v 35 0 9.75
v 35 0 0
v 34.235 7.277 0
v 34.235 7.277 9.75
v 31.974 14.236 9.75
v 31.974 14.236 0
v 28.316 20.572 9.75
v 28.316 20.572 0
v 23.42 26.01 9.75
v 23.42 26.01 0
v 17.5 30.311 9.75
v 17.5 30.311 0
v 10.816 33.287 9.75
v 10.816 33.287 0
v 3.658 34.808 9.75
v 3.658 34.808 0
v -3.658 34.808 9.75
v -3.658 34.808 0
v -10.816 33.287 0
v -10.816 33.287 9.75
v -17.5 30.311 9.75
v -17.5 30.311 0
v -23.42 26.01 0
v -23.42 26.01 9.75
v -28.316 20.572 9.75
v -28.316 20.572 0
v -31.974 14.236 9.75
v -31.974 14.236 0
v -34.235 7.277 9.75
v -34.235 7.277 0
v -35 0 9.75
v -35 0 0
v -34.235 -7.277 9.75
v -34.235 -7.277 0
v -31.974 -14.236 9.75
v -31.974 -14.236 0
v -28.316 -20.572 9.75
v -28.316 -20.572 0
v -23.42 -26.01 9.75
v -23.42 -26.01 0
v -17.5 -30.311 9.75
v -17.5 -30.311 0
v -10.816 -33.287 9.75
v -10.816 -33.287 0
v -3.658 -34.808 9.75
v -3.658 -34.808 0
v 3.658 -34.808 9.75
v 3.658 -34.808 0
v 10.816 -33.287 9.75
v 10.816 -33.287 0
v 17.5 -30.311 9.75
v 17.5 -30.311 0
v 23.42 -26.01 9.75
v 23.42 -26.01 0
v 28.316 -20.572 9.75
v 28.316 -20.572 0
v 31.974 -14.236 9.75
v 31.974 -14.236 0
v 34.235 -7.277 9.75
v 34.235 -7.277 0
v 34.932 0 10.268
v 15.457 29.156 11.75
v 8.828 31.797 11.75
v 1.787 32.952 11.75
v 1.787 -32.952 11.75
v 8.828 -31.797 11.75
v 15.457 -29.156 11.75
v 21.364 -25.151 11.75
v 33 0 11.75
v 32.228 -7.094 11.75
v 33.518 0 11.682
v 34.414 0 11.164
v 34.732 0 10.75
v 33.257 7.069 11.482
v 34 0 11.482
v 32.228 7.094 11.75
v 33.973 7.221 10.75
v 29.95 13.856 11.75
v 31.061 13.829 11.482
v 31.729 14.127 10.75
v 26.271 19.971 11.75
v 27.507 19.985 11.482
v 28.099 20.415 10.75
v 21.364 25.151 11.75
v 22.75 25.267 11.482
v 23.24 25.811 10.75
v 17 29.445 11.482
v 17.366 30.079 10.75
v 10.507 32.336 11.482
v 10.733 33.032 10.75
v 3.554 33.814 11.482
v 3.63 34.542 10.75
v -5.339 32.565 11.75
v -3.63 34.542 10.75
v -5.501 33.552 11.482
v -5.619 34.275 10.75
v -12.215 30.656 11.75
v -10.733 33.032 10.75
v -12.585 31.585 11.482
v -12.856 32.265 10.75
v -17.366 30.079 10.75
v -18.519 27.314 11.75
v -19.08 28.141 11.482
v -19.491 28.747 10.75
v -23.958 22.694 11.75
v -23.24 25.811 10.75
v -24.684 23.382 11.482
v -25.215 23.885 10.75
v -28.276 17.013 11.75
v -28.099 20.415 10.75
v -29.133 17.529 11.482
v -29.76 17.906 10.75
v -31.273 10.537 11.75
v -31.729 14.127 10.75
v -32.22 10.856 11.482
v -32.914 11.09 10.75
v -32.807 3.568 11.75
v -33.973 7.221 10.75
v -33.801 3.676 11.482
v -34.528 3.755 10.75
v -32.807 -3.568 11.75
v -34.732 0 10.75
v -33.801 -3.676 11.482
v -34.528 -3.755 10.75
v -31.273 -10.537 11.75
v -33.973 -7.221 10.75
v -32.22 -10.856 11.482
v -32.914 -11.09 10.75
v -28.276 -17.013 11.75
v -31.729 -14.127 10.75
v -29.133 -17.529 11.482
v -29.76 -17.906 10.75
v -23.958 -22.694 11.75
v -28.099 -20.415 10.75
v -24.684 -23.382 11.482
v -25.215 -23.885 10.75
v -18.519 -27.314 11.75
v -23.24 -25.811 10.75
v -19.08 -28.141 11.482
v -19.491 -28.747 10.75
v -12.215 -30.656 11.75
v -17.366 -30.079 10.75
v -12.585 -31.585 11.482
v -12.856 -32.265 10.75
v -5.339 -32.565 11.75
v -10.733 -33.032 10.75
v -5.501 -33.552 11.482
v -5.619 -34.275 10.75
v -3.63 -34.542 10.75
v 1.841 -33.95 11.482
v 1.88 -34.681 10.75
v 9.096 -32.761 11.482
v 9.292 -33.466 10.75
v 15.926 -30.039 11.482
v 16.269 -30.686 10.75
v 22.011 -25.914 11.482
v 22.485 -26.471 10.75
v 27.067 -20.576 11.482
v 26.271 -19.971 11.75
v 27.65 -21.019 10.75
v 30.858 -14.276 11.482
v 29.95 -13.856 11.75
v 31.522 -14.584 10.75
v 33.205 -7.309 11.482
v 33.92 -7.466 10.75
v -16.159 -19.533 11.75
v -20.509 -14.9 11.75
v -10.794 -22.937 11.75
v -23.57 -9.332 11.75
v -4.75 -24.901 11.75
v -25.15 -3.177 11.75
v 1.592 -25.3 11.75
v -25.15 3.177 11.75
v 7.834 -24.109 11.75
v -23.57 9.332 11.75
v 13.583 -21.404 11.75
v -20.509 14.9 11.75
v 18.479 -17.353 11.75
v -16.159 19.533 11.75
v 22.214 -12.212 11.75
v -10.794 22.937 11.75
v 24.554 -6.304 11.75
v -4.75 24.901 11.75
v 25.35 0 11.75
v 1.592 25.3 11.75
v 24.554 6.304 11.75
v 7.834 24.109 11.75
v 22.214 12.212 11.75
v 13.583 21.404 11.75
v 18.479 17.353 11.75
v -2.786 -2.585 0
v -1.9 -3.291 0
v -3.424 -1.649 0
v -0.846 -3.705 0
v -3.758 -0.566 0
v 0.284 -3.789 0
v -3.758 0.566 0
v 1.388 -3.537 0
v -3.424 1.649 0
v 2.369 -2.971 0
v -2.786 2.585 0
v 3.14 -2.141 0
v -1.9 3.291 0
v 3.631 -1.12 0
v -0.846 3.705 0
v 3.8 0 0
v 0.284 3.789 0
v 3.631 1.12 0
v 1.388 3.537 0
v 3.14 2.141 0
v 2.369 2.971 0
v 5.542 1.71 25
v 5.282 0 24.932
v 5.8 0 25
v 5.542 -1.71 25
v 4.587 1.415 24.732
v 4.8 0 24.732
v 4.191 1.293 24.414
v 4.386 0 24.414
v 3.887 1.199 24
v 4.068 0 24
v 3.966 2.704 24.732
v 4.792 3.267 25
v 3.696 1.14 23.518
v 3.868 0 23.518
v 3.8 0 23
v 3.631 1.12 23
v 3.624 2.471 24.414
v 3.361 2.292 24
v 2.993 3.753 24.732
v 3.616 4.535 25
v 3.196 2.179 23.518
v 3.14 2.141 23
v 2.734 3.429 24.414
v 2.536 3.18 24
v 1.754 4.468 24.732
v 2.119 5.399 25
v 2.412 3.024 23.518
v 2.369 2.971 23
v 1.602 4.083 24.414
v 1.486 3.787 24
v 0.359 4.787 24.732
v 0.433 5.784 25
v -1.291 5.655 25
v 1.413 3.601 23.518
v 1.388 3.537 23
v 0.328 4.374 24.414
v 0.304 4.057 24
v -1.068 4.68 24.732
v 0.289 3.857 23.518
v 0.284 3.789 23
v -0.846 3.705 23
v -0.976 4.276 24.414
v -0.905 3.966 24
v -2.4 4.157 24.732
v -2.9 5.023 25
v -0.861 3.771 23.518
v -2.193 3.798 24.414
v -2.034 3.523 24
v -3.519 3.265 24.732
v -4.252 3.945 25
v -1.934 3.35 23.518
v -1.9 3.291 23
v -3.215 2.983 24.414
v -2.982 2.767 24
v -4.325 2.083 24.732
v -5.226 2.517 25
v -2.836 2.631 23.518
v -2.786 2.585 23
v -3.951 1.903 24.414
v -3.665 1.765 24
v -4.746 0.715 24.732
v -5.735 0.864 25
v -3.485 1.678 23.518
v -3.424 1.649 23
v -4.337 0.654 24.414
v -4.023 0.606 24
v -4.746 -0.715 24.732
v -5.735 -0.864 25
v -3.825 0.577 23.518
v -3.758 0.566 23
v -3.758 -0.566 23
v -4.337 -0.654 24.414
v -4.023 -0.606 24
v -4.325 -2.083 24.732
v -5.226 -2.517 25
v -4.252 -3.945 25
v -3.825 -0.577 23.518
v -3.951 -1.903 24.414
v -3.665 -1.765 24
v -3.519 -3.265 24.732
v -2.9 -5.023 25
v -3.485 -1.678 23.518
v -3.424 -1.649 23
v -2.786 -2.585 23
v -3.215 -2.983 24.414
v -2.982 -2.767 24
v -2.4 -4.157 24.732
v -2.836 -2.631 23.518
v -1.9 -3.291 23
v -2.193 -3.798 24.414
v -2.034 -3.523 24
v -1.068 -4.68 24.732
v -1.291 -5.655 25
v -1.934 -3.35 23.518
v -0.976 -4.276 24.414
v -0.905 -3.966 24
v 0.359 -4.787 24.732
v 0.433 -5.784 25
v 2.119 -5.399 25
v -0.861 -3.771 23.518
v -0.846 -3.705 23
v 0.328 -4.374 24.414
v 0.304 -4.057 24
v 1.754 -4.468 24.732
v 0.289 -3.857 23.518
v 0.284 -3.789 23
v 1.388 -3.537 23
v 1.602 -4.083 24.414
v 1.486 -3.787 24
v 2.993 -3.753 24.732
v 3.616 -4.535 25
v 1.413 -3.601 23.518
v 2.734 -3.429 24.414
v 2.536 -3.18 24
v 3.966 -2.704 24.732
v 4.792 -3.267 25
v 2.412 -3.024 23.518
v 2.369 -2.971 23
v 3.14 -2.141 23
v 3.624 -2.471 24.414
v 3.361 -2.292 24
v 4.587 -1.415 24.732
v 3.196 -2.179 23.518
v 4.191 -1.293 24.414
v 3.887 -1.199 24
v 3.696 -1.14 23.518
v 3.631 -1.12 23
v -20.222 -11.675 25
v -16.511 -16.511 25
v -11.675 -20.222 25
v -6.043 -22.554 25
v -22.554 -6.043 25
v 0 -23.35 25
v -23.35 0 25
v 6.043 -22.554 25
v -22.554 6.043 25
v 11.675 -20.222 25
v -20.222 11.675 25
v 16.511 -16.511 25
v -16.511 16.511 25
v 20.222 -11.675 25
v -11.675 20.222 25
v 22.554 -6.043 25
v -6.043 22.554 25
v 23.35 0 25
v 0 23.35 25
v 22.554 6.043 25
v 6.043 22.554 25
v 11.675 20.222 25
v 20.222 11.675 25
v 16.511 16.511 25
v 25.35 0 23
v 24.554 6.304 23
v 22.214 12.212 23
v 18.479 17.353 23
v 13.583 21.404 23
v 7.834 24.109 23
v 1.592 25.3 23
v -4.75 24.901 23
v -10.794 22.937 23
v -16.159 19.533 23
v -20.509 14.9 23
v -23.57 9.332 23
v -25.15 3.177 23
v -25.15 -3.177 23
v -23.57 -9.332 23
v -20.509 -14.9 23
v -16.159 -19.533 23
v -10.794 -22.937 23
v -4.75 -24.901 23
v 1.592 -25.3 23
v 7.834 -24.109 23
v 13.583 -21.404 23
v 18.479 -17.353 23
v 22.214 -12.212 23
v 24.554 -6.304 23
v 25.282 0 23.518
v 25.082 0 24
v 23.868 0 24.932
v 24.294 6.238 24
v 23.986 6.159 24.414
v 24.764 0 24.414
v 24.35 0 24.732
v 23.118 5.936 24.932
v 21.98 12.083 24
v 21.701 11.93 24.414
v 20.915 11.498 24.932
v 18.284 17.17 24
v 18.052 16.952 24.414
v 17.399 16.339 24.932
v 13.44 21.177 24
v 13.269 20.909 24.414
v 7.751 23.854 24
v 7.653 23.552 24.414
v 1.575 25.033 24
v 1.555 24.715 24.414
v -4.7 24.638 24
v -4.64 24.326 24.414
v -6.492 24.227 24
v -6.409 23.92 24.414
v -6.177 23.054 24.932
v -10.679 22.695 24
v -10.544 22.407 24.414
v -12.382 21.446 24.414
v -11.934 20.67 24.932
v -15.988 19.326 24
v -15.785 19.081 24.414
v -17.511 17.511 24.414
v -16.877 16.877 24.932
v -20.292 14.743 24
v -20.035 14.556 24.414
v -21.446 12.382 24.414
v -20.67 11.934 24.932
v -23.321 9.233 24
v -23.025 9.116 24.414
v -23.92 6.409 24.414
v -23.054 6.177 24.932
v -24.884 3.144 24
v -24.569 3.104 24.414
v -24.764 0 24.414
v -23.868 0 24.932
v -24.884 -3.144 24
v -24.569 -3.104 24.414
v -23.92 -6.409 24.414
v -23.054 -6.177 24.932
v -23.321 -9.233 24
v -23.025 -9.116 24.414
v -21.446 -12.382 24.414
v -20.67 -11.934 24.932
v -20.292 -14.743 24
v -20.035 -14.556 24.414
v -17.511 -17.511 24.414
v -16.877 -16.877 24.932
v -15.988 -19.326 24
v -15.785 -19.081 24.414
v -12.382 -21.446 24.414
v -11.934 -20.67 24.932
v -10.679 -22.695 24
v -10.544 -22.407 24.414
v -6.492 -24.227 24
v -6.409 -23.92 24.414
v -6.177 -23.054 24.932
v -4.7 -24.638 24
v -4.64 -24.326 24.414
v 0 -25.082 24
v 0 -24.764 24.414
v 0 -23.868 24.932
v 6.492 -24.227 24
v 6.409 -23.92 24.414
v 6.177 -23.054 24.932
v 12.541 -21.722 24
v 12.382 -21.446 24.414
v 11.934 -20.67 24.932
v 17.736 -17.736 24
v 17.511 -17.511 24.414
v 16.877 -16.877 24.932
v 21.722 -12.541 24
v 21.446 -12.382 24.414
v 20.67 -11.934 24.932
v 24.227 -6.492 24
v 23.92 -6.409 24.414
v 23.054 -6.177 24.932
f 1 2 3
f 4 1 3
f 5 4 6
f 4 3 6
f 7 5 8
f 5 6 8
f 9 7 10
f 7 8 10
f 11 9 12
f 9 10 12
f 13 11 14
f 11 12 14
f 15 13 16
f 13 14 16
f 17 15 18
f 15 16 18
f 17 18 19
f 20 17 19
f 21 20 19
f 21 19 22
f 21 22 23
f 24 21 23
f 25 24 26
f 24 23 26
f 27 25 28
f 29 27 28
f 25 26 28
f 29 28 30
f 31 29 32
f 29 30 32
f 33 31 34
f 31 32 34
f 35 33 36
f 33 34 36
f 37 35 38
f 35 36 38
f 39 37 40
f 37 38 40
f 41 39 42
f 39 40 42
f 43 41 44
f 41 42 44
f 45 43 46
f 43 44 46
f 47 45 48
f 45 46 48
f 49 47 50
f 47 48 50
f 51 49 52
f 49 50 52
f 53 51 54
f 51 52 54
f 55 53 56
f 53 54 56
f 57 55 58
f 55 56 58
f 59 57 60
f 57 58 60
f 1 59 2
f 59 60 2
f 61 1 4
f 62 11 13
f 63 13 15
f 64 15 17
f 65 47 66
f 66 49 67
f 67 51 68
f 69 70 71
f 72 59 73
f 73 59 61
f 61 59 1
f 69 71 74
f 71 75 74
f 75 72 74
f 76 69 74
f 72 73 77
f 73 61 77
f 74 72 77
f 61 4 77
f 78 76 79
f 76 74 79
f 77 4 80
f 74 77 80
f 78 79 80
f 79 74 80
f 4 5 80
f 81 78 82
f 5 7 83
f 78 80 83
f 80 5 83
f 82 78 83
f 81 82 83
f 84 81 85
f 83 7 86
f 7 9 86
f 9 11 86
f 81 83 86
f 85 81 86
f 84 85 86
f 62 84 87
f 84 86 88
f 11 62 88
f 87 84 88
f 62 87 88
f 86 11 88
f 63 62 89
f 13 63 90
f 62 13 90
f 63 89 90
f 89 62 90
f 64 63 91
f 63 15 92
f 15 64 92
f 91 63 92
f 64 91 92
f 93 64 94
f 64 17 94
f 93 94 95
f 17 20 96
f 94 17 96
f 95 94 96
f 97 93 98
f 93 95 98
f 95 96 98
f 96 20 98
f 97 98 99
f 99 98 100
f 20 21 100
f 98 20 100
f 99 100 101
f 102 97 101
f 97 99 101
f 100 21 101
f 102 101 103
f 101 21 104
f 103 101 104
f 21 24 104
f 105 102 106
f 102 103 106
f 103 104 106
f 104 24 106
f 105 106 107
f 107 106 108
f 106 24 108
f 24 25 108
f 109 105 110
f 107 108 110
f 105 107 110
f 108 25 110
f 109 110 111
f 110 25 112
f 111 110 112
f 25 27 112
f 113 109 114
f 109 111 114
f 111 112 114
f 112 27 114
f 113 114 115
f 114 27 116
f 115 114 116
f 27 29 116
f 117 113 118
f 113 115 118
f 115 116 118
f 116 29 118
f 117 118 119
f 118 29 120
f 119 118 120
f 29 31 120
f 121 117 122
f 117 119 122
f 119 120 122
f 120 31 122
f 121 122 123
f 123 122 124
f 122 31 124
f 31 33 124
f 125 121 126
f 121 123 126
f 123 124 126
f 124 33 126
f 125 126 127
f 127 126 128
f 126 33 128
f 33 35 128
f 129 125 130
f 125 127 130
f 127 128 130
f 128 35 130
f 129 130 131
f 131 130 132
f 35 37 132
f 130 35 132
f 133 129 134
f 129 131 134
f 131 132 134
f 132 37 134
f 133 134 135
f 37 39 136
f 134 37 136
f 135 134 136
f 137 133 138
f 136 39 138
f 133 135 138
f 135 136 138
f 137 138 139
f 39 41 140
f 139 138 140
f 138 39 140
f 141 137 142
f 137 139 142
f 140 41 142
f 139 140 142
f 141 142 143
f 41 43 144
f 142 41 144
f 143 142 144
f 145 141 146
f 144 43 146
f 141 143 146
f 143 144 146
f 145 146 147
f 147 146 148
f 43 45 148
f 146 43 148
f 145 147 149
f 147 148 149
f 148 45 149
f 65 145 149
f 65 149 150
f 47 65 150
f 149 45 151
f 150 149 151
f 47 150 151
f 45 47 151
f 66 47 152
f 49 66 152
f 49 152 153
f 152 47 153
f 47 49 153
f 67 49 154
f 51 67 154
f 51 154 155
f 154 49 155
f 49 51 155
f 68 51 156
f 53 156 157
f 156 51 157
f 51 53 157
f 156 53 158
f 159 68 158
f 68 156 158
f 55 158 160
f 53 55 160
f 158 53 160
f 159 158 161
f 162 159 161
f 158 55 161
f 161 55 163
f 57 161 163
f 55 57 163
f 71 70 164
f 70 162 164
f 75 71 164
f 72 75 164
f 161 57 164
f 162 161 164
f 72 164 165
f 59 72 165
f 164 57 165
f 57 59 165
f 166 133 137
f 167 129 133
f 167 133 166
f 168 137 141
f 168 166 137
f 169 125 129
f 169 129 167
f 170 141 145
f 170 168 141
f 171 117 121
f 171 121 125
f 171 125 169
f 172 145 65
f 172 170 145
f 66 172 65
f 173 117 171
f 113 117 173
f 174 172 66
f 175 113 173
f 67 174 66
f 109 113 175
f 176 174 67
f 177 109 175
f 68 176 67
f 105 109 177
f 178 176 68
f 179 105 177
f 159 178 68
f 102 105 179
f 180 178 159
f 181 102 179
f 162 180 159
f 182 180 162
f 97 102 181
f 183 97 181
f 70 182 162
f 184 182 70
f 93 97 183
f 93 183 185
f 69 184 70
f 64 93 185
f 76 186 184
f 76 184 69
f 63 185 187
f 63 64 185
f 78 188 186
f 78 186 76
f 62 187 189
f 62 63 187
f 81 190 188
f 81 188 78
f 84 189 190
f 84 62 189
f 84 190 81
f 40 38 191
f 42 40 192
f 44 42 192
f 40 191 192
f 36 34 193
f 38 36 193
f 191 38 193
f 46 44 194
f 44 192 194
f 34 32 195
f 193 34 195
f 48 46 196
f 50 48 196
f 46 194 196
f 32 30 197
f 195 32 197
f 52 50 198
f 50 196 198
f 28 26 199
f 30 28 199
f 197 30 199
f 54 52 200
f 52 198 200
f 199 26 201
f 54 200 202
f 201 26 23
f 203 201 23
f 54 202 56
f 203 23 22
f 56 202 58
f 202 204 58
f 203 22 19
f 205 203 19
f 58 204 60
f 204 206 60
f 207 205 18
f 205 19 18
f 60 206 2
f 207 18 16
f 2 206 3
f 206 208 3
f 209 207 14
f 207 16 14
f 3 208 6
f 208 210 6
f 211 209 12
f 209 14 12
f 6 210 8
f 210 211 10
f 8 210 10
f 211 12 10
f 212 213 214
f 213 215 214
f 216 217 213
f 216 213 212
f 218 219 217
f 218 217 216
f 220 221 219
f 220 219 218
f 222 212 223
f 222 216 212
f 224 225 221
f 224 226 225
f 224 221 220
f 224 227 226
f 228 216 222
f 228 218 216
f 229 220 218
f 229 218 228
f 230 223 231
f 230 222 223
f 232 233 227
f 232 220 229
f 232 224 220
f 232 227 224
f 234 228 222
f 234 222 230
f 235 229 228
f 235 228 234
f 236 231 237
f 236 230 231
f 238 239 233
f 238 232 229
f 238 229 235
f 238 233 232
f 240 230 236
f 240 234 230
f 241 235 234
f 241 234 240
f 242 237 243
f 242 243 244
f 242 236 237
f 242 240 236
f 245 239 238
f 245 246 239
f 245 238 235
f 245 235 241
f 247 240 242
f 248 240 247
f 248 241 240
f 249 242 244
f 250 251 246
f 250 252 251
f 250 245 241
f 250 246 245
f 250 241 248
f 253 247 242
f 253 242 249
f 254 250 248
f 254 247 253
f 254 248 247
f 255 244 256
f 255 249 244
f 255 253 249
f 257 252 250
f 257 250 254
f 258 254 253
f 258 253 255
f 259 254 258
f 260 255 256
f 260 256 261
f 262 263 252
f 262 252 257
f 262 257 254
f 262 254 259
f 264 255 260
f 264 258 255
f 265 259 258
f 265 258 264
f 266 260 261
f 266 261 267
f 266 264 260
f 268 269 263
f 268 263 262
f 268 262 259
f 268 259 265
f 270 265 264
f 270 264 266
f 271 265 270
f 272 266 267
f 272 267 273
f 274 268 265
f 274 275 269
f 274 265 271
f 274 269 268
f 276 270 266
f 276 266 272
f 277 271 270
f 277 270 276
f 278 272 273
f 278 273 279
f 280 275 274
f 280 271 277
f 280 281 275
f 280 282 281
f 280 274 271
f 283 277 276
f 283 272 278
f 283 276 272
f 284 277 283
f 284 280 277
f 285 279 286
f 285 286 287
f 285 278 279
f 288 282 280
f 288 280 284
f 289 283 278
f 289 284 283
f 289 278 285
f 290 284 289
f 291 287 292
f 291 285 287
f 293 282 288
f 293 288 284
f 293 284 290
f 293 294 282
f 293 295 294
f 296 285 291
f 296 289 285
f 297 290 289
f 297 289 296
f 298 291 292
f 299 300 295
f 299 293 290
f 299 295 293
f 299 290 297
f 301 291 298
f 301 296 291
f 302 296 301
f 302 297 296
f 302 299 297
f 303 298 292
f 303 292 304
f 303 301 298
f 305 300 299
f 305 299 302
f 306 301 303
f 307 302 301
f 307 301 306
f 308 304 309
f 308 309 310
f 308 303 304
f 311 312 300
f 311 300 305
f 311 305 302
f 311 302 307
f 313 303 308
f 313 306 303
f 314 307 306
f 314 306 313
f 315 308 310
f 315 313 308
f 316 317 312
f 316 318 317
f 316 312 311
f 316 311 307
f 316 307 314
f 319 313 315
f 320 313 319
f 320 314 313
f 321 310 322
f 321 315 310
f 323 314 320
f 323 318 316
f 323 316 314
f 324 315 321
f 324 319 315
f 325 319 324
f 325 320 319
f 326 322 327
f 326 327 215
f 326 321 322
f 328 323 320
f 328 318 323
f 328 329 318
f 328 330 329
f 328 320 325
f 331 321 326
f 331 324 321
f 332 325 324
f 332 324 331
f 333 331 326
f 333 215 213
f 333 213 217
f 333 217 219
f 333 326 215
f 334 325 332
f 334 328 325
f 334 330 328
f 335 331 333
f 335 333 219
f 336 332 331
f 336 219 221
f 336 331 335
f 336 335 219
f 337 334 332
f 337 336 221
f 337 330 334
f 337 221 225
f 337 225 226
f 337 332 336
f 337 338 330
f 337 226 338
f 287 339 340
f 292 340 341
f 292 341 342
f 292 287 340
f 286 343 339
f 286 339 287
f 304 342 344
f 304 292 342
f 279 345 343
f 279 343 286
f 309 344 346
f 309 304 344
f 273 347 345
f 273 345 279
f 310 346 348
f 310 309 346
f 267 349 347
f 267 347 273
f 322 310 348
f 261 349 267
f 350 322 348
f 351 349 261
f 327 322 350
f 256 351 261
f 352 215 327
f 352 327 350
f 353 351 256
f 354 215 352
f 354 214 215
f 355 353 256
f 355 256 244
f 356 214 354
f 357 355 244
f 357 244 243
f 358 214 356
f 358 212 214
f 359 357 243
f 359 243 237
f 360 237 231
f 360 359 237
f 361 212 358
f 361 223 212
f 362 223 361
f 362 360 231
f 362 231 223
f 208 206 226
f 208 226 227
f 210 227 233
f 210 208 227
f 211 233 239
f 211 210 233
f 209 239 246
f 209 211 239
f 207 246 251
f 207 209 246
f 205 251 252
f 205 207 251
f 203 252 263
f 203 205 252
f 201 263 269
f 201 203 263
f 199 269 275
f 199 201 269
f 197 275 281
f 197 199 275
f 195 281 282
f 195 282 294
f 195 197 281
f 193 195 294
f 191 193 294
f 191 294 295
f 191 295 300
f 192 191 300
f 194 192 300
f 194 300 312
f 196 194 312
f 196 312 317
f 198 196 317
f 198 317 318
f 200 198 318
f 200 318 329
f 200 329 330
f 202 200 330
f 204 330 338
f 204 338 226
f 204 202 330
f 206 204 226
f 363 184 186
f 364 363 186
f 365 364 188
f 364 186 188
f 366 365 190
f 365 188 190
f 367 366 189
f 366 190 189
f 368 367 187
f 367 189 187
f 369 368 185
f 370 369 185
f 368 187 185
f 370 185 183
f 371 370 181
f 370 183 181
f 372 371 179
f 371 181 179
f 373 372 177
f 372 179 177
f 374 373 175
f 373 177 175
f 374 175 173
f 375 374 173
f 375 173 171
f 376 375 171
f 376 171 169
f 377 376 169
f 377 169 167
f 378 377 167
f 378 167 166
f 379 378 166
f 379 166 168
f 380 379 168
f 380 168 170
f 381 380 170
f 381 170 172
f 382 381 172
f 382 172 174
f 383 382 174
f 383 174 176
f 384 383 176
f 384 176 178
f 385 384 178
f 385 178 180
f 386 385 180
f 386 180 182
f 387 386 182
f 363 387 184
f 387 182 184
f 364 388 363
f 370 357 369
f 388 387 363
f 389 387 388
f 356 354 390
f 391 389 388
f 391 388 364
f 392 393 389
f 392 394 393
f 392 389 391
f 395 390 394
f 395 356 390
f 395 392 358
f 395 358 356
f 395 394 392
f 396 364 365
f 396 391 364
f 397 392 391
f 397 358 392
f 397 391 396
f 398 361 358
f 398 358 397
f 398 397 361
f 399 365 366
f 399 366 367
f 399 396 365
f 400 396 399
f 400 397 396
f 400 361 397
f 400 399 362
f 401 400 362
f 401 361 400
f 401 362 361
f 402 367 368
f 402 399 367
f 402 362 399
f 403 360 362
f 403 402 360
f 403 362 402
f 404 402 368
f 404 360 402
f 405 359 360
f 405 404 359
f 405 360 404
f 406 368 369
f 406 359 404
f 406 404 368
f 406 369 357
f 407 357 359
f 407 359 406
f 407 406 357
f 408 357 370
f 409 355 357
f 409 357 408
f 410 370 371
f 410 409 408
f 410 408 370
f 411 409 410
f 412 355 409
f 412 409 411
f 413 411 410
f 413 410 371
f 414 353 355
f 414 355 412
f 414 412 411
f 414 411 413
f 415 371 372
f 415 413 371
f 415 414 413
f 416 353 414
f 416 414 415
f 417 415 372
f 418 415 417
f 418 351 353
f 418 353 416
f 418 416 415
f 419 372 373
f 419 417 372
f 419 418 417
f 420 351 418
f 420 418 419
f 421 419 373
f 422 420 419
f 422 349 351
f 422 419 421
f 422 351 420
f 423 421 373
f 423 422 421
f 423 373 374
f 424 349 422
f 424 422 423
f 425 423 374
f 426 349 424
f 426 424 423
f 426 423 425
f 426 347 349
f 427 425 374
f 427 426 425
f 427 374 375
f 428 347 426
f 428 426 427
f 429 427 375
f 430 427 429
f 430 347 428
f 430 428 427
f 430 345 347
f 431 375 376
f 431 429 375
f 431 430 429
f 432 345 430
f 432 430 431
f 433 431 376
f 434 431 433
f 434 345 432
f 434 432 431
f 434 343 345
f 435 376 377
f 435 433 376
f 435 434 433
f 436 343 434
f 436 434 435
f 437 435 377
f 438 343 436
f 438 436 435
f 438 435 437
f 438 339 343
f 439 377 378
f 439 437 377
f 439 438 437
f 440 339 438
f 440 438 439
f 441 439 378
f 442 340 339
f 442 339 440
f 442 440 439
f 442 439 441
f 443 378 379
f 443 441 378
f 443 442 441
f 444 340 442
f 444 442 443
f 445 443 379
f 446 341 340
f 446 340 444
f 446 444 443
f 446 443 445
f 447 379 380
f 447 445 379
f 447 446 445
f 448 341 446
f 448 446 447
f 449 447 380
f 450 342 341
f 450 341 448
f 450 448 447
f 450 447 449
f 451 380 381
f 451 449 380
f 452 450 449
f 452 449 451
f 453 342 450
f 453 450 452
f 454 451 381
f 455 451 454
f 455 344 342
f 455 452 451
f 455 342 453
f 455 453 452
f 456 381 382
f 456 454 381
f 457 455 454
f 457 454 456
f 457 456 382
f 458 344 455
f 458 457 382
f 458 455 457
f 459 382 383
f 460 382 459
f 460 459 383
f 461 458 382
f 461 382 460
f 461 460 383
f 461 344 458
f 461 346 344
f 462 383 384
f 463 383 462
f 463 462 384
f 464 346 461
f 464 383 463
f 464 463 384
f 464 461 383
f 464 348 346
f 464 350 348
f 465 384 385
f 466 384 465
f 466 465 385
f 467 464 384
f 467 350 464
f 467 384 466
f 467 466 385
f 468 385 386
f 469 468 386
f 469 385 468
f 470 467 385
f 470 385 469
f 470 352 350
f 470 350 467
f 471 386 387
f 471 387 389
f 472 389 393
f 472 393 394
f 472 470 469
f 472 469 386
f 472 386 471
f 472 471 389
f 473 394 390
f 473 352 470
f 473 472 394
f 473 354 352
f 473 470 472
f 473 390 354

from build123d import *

# Parameters (mm, degrees)
F0_R     = 35
F0_R_2   = 25.35
F1_DEPTH = 11.75
F0_R_3   = 3.8
F2_DEPTH = 25
F3_R     = 2


with BuildPart() as f1:
    # F0 (on Top) → F1 (new body)
    with BuildSketch(Plane.XY):
        Circle(F0_R)
        Circle(F0_R_2, mode=Mode.SUBTRACT)
    extrude(amount=F1_DEPTH)

    # F0 (on Top) → F2 (join)
    with BuildSketch(Plane.XY):
        Circle(F0_R_2)
        Circle(F0_R_3, mode=Mode.SUBTRACT)
    extrude(amount=F2_DEPTH)

    # F3
    f3_edges = [f1.edges().sort_by_distance(p)[0] for p in [
        (-35, 0, 11.75),
        (-25.35, 0, 25),
        (-3.8, 0, 25),
    ]]
    fillet(f3_edges, radius=F3_R)


solid = f1.part
